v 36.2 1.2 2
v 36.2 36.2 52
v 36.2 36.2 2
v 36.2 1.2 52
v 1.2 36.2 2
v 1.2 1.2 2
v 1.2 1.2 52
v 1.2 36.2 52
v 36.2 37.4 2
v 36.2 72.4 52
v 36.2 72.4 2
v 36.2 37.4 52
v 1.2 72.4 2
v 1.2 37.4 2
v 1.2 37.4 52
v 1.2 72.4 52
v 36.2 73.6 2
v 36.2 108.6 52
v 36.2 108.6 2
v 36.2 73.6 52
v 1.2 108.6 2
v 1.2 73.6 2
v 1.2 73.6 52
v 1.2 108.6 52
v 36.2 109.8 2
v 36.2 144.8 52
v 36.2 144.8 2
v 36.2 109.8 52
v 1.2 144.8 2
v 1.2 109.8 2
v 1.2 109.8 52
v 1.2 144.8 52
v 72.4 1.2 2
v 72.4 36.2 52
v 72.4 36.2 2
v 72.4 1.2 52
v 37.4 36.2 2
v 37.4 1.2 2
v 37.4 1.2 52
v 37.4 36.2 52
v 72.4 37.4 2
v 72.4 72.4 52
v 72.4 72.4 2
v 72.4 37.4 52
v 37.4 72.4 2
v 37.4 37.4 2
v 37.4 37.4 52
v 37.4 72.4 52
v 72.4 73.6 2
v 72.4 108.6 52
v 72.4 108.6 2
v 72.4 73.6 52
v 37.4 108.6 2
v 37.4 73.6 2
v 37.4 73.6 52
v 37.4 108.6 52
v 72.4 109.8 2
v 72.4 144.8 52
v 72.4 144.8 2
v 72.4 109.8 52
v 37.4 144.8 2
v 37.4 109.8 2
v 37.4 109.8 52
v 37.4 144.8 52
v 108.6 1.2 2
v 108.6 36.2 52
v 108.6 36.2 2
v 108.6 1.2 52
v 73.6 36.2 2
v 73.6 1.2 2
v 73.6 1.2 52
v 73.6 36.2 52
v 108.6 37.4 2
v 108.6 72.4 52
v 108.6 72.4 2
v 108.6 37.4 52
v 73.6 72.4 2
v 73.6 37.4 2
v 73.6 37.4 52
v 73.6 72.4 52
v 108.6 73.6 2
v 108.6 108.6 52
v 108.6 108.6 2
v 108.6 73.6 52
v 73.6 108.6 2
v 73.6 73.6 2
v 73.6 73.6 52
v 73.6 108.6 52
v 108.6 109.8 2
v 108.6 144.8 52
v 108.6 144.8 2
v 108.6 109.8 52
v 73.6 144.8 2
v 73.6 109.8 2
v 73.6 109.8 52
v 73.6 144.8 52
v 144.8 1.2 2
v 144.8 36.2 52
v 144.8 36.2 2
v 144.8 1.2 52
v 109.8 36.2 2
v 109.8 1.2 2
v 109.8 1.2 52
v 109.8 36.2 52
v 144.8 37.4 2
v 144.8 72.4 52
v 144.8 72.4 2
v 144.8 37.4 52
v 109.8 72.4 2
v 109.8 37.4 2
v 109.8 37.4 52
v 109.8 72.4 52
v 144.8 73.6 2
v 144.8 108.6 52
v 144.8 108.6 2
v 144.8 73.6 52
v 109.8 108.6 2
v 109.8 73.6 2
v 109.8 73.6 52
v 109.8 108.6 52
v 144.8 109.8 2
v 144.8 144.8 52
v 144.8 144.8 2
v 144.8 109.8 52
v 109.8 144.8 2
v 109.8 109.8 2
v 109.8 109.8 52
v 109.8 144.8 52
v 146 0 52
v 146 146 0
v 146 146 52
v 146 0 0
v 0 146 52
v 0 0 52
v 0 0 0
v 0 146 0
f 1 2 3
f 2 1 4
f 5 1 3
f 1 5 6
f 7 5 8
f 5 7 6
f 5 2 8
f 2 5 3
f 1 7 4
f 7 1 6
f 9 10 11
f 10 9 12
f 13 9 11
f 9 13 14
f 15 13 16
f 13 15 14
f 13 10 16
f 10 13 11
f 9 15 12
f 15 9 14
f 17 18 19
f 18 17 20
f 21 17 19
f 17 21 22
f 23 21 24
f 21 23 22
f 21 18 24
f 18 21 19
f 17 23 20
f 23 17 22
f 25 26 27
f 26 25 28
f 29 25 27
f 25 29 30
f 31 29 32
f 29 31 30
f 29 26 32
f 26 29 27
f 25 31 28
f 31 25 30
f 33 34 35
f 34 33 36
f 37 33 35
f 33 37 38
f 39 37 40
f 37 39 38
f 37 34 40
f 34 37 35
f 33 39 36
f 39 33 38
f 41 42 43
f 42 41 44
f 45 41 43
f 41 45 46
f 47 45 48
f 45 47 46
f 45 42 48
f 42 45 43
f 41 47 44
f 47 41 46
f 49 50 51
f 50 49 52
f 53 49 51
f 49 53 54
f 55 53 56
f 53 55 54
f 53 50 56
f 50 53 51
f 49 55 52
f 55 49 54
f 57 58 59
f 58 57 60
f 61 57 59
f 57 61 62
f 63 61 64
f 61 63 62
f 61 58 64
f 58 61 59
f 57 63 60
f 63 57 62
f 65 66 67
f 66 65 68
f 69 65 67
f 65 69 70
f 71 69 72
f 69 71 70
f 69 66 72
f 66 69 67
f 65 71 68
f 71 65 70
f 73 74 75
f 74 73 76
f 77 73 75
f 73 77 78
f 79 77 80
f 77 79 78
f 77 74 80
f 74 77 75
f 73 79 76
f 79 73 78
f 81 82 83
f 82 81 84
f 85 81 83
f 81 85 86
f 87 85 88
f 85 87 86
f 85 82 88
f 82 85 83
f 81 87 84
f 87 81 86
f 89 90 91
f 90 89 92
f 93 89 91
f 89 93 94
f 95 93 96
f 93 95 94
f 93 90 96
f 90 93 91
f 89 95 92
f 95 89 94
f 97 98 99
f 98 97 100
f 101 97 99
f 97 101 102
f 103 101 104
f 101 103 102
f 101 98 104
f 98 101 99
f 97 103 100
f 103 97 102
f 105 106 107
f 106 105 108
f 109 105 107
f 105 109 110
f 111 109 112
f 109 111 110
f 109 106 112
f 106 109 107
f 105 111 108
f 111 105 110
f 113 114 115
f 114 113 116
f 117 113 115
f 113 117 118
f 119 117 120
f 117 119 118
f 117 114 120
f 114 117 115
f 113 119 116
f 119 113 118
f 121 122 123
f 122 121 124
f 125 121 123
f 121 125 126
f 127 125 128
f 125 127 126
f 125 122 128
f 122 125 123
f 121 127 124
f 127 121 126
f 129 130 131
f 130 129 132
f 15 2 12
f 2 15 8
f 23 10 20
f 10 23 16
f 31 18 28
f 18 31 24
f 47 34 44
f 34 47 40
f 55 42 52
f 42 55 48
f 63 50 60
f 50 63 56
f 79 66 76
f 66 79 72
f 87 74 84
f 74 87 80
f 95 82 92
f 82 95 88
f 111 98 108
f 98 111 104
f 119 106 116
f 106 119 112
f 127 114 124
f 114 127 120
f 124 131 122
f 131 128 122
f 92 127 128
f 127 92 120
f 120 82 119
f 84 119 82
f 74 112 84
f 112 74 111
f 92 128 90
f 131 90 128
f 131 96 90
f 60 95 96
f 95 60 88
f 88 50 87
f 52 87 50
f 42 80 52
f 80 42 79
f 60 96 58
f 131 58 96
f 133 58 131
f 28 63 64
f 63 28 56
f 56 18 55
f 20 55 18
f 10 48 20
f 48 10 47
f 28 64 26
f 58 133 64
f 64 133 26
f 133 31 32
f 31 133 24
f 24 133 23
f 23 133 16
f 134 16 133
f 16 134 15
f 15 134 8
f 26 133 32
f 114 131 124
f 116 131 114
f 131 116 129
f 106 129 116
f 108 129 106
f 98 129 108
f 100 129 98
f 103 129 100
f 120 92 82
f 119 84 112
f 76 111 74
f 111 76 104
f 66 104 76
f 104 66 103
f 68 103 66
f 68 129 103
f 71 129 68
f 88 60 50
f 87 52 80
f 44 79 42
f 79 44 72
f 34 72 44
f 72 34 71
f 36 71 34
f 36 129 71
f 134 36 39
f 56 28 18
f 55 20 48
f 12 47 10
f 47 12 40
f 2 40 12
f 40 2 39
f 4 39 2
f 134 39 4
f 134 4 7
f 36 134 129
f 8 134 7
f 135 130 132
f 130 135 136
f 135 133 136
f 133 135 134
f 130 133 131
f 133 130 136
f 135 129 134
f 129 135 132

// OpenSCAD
/* [Part] */
part = 0; // [0:base,1:lid]

/* [Base] */
// height of base (mm)
height = 50;
// Width of compartment (mm)
x_width = 35;
// Width of compartment (mm)
y_width = 35;
// Number of compartments
x_num = 4;
// Number of compartments
y_num = 4;
// Width of internal separator walls (mm)
separator_width = 1.2;
// Separator wall shorter than outer wall by (mm)
separator_shorter_by = 0;
// Thickness of base outer wall (mm)
base_wall_thickness = 1.2;
// Thickness of base bottom (mm)
base_thickness = 2;

/* [Lid] */
// Thicknes of lid outer wall (mm)
lid_wall_thickness = 1.2;
// Thickness of lid top (mm)
lid_thickness = 2;
// Height of lid as percentage of base height
lid_height_percent = 50;
// Clearance between lid and base
clearance = 0.75;

base_x = (base_wall_thickness * 2) + (x_width * x_num) + (separator_width * (x_num - 1));
base_y = (base_wall_thickness * 2) + (y_width * y_num) + (separator_width * (y_num - 1));
base_height = base_thickness + height;

lid_x = base_x + (lid_wall_thickness * 2) + (clearance * 2);
lid_y = base_y + (lid_wall_thickness * 2) + (clearance * 2);
lid_height = base_height * (lid_height_percent / 100);

if (part == 0)
    bottom();
else
    top();

module bottom()
    {
    difference()
        {
        cube([base_x, base_y, base_height]);
        for (x = [0:x_num - 1])
            {
            for (y = [0:y_num - 1])
                {
                translate([base_wall_thickness + ((x_width + separator_width) * x), base_wall_thickness + ((y_width + separator_width) * y), base_thickness]) cube([x_width, y_width, height + 1]);
                }
            }
        if (separator_shorter_by > 0)
            {
            translate([base_wall_thickness, base_wall_thickness, base_height - separator_shorter_by]) cube([base_x - base_wall_thickness * 2, base_y - base_wall_thickness * 2, separator_shorter_by + 1]);
            }
        }
    }
    
module top()
    {
    difference()
        {
        cube([lid_x, lid_y, lid_height]);
        translate([lid_wall_thickness, lid_wall_thickness, lid_thickness])
            cube([lid_x - (lid_wall_thickness * 2) , lid_y - (lid_wall_thickness * 2), lid_height + 1]);
        }
    }
